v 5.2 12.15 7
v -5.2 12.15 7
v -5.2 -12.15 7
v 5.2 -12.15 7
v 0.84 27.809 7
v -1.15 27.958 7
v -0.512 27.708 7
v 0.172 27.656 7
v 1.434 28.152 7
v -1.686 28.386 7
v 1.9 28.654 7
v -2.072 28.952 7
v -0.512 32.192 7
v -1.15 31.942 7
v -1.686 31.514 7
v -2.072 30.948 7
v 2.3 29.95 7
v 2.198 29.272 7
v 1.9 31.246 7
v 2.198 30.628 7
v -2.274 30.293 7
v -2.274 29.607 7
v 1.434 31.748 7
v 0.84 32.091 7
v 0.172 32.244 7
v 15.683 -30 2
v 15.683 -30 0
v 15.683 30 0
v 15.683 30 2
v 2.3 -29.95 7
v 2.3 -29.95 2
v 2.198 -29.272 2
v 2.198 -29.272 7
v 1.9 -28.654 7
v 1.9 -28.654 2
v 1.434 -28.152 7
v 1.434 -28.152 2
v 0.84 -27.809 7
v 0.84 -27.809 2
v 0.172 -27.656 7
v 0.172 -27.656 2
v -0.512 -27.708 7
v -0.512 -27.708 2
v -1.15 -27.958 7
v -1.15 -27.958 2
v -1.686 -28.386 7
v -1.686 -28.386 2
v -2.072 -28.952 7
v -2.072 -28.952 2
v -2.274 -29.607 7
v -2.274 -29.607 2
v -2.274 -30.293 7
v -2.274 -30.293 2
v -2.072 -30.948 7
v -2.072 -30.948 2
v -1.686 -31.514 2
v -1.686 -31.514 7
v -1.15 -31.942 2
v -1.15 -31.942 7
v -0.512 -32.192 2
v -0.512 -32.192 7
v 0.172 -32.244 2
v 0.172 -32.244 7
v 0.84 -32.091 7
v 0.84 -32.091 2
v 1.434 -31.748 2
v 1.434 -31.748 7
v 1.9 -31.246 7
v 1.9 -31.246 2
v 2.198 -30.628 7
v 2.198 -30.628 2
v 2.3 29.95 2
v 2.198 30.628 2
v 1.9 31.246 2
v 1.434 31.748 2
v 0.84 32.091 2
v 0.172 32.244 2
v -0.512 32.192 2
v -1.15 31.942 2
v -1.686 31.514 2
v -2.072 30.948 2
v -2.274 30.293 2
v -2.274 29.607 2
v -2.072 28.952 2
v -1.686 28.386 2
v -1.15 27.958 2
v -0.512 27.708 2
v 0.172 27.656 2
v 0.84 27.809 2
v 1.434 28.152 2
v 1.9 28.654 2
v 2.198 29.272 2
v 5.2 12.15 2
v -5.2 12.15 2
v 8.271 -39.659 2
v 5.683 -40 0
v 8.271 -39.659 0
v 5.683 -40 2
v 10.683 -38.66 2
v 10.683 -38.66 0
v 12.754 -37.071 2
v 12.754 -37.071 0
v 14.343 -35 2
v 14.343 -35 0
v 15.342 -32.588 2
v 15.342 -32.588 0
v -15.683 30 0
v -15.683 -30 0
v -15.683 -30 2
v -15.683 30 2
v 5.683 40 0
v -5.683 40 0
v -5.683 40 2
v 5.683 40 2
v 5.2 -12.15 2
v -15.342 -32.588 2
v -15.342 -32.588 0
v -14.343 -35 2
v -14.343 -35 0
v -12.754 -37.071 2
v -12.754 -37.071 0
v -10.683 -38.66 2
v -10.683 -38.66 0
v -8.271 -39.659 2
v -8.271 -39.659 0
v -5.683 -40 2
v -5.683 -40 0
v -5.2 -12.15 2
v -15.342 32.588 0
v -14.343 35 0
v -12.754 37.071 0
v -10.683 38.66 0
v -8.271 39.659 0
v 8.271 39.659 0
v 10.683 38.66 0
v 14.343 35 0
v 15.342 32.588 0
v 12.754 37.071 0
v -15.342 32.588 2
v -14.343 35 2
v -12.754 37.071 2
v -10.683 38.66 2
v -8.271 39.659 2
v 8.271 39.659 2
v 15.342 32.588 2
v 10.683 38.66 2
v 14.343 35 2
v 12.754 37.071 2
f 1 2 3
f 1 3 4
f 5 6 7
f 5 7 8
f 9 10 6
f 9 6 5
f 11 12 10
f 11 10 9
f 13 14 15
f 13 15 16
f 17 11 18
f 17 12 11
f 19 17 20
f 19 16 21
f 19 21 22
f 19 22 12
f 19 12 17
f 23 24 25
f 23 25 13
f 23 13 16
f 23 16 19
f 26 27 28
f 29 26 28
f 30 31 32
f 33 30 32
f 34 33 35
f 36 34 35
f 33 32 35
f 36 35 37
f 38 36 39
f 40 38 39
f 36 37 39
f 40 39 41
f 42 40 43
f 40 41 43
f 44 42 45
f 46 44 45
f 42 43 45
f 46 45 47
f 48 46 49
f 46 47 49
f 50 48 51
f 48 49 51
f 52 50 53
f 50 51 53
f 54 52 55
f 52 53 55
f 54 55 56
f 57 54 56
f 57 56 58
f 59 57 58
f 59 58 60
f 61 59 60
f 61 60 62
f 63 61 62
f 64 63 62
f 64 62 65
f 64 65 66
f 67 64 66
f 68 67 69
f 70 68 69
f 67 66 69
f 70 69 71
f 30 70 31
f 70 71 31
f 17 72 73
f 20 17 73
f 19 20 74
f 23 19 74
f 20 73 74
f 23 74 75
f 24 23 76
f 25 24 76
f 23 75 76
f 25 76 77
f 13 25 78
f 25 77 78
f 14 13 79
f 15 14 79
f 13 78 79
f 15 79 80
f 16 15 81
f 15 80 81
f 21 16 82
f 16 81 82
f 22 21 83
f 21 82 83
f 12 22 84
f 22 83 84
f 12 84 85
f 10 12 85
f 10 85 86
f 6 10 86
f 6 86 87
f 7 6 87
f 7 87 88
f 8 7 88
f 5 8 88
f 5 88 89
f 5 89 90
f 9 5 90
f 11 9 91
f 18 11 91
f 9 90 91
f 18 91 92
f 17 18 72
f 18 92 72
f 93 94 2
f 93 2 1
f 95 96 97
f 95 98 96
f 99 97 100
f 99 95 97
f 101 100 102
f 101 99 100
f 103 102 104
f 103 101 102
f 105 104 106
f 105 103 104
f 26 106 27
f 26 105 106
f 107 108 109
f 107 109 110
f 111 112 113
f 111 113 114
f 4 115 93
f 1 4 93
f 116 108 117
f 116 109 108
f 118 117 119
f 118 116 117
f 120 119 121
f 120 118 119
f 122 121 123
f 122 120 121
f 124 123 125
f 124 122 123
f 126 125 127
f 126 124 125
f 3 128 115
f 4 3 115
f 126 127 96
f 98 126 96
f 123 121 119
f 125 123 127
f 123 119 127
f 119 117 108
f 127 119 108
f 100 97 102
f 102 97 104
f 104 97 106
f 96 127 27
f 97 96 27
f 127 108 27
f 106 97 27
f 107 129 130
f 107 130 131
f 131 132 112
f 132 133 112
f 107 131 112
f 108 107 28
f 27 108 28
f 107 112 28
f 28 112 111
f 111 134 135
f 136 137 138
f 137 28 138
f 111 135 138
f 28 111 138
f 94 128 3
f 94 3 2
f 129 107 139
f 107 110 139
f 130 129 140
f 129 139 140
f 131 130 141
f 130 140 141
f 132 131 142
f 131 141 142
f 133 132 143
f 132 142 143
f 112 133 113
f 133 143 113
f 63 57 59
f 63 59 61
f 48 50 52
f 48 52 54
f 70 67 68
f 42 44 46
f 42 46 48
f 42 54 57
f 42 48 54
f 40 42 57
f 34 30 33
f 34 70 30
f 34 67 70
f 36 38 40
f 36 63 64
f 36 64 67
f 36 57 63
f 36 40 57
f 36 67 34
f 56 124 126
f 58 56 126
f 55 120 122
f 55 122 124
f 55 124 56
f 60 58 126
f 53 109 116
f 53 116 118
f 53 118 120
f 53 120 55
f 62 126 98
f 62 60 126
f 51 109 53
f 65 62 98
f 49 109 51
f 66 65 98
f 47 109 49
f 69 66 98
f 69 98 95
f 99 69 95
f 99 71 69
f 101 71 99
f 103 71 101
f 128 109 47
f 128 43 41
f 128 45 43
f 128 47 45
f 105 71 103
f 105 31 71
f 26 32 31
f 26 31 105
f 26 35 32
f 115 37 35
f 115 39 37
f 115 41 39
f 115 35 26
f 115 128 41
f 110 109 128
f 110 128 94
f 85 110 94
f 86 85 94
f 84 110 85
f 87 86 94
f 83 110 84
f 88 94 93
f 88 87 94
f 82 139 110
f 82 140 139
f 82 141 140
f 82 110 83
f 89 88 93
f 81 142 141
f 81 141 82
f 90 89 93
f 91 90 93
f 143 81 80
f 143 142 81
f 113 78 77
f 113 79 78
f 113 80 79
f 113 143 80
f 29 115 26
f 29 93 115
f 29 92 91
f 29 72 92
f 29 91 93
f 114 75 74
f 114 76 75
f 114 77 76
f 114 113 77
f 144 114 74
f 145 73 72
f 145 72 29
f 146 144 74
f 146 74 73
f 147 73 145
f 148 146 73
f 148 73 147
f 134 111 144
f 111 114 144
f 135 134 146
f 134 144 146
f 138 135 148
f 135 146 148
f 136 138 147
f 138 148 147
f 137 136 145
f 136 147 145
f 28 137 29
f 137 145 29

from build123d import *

# Parameters (mm, degrees)
F0_W     = 31.366382
F0_H     = 80
F1_DEPTH = 2
F2_W     = 10.4
F2_H     = 24.3
F2_R     = 2.3
F3_DEPTH = 5
F4_R     = 10


with BuildPart() as f1:
    # F0 (on Top) → F1 (new body)
    with BuildSketch(Plane.XY):
        Rectangle(F0_W, F0_H)
    extrude(amount=F1_DEPTH)

    # F2 (on face) → F3 (join)
    with BuildSketch(Plane.XY.offset(2)):
        Rectangle(F2_W, F2_H)
        with Locations((0, 29.95)):
            Circle(F2_R)
        with Locations((0, -29.95)):
            Circle(F2_R)
    extrude(amount=F3_DEPTH)

    # F4
    f4_edges = [f1.edges().sort_by_distance(p)[0] for p in [
        (-15.683191, 40, 1),
        (15.683191, 40, 1),
        (15.683191, -40, 1),
        (-15.683191, -40, 1),
    ]]
    fillet(f4_edges, radius=F4_R)


solid = f1.part
